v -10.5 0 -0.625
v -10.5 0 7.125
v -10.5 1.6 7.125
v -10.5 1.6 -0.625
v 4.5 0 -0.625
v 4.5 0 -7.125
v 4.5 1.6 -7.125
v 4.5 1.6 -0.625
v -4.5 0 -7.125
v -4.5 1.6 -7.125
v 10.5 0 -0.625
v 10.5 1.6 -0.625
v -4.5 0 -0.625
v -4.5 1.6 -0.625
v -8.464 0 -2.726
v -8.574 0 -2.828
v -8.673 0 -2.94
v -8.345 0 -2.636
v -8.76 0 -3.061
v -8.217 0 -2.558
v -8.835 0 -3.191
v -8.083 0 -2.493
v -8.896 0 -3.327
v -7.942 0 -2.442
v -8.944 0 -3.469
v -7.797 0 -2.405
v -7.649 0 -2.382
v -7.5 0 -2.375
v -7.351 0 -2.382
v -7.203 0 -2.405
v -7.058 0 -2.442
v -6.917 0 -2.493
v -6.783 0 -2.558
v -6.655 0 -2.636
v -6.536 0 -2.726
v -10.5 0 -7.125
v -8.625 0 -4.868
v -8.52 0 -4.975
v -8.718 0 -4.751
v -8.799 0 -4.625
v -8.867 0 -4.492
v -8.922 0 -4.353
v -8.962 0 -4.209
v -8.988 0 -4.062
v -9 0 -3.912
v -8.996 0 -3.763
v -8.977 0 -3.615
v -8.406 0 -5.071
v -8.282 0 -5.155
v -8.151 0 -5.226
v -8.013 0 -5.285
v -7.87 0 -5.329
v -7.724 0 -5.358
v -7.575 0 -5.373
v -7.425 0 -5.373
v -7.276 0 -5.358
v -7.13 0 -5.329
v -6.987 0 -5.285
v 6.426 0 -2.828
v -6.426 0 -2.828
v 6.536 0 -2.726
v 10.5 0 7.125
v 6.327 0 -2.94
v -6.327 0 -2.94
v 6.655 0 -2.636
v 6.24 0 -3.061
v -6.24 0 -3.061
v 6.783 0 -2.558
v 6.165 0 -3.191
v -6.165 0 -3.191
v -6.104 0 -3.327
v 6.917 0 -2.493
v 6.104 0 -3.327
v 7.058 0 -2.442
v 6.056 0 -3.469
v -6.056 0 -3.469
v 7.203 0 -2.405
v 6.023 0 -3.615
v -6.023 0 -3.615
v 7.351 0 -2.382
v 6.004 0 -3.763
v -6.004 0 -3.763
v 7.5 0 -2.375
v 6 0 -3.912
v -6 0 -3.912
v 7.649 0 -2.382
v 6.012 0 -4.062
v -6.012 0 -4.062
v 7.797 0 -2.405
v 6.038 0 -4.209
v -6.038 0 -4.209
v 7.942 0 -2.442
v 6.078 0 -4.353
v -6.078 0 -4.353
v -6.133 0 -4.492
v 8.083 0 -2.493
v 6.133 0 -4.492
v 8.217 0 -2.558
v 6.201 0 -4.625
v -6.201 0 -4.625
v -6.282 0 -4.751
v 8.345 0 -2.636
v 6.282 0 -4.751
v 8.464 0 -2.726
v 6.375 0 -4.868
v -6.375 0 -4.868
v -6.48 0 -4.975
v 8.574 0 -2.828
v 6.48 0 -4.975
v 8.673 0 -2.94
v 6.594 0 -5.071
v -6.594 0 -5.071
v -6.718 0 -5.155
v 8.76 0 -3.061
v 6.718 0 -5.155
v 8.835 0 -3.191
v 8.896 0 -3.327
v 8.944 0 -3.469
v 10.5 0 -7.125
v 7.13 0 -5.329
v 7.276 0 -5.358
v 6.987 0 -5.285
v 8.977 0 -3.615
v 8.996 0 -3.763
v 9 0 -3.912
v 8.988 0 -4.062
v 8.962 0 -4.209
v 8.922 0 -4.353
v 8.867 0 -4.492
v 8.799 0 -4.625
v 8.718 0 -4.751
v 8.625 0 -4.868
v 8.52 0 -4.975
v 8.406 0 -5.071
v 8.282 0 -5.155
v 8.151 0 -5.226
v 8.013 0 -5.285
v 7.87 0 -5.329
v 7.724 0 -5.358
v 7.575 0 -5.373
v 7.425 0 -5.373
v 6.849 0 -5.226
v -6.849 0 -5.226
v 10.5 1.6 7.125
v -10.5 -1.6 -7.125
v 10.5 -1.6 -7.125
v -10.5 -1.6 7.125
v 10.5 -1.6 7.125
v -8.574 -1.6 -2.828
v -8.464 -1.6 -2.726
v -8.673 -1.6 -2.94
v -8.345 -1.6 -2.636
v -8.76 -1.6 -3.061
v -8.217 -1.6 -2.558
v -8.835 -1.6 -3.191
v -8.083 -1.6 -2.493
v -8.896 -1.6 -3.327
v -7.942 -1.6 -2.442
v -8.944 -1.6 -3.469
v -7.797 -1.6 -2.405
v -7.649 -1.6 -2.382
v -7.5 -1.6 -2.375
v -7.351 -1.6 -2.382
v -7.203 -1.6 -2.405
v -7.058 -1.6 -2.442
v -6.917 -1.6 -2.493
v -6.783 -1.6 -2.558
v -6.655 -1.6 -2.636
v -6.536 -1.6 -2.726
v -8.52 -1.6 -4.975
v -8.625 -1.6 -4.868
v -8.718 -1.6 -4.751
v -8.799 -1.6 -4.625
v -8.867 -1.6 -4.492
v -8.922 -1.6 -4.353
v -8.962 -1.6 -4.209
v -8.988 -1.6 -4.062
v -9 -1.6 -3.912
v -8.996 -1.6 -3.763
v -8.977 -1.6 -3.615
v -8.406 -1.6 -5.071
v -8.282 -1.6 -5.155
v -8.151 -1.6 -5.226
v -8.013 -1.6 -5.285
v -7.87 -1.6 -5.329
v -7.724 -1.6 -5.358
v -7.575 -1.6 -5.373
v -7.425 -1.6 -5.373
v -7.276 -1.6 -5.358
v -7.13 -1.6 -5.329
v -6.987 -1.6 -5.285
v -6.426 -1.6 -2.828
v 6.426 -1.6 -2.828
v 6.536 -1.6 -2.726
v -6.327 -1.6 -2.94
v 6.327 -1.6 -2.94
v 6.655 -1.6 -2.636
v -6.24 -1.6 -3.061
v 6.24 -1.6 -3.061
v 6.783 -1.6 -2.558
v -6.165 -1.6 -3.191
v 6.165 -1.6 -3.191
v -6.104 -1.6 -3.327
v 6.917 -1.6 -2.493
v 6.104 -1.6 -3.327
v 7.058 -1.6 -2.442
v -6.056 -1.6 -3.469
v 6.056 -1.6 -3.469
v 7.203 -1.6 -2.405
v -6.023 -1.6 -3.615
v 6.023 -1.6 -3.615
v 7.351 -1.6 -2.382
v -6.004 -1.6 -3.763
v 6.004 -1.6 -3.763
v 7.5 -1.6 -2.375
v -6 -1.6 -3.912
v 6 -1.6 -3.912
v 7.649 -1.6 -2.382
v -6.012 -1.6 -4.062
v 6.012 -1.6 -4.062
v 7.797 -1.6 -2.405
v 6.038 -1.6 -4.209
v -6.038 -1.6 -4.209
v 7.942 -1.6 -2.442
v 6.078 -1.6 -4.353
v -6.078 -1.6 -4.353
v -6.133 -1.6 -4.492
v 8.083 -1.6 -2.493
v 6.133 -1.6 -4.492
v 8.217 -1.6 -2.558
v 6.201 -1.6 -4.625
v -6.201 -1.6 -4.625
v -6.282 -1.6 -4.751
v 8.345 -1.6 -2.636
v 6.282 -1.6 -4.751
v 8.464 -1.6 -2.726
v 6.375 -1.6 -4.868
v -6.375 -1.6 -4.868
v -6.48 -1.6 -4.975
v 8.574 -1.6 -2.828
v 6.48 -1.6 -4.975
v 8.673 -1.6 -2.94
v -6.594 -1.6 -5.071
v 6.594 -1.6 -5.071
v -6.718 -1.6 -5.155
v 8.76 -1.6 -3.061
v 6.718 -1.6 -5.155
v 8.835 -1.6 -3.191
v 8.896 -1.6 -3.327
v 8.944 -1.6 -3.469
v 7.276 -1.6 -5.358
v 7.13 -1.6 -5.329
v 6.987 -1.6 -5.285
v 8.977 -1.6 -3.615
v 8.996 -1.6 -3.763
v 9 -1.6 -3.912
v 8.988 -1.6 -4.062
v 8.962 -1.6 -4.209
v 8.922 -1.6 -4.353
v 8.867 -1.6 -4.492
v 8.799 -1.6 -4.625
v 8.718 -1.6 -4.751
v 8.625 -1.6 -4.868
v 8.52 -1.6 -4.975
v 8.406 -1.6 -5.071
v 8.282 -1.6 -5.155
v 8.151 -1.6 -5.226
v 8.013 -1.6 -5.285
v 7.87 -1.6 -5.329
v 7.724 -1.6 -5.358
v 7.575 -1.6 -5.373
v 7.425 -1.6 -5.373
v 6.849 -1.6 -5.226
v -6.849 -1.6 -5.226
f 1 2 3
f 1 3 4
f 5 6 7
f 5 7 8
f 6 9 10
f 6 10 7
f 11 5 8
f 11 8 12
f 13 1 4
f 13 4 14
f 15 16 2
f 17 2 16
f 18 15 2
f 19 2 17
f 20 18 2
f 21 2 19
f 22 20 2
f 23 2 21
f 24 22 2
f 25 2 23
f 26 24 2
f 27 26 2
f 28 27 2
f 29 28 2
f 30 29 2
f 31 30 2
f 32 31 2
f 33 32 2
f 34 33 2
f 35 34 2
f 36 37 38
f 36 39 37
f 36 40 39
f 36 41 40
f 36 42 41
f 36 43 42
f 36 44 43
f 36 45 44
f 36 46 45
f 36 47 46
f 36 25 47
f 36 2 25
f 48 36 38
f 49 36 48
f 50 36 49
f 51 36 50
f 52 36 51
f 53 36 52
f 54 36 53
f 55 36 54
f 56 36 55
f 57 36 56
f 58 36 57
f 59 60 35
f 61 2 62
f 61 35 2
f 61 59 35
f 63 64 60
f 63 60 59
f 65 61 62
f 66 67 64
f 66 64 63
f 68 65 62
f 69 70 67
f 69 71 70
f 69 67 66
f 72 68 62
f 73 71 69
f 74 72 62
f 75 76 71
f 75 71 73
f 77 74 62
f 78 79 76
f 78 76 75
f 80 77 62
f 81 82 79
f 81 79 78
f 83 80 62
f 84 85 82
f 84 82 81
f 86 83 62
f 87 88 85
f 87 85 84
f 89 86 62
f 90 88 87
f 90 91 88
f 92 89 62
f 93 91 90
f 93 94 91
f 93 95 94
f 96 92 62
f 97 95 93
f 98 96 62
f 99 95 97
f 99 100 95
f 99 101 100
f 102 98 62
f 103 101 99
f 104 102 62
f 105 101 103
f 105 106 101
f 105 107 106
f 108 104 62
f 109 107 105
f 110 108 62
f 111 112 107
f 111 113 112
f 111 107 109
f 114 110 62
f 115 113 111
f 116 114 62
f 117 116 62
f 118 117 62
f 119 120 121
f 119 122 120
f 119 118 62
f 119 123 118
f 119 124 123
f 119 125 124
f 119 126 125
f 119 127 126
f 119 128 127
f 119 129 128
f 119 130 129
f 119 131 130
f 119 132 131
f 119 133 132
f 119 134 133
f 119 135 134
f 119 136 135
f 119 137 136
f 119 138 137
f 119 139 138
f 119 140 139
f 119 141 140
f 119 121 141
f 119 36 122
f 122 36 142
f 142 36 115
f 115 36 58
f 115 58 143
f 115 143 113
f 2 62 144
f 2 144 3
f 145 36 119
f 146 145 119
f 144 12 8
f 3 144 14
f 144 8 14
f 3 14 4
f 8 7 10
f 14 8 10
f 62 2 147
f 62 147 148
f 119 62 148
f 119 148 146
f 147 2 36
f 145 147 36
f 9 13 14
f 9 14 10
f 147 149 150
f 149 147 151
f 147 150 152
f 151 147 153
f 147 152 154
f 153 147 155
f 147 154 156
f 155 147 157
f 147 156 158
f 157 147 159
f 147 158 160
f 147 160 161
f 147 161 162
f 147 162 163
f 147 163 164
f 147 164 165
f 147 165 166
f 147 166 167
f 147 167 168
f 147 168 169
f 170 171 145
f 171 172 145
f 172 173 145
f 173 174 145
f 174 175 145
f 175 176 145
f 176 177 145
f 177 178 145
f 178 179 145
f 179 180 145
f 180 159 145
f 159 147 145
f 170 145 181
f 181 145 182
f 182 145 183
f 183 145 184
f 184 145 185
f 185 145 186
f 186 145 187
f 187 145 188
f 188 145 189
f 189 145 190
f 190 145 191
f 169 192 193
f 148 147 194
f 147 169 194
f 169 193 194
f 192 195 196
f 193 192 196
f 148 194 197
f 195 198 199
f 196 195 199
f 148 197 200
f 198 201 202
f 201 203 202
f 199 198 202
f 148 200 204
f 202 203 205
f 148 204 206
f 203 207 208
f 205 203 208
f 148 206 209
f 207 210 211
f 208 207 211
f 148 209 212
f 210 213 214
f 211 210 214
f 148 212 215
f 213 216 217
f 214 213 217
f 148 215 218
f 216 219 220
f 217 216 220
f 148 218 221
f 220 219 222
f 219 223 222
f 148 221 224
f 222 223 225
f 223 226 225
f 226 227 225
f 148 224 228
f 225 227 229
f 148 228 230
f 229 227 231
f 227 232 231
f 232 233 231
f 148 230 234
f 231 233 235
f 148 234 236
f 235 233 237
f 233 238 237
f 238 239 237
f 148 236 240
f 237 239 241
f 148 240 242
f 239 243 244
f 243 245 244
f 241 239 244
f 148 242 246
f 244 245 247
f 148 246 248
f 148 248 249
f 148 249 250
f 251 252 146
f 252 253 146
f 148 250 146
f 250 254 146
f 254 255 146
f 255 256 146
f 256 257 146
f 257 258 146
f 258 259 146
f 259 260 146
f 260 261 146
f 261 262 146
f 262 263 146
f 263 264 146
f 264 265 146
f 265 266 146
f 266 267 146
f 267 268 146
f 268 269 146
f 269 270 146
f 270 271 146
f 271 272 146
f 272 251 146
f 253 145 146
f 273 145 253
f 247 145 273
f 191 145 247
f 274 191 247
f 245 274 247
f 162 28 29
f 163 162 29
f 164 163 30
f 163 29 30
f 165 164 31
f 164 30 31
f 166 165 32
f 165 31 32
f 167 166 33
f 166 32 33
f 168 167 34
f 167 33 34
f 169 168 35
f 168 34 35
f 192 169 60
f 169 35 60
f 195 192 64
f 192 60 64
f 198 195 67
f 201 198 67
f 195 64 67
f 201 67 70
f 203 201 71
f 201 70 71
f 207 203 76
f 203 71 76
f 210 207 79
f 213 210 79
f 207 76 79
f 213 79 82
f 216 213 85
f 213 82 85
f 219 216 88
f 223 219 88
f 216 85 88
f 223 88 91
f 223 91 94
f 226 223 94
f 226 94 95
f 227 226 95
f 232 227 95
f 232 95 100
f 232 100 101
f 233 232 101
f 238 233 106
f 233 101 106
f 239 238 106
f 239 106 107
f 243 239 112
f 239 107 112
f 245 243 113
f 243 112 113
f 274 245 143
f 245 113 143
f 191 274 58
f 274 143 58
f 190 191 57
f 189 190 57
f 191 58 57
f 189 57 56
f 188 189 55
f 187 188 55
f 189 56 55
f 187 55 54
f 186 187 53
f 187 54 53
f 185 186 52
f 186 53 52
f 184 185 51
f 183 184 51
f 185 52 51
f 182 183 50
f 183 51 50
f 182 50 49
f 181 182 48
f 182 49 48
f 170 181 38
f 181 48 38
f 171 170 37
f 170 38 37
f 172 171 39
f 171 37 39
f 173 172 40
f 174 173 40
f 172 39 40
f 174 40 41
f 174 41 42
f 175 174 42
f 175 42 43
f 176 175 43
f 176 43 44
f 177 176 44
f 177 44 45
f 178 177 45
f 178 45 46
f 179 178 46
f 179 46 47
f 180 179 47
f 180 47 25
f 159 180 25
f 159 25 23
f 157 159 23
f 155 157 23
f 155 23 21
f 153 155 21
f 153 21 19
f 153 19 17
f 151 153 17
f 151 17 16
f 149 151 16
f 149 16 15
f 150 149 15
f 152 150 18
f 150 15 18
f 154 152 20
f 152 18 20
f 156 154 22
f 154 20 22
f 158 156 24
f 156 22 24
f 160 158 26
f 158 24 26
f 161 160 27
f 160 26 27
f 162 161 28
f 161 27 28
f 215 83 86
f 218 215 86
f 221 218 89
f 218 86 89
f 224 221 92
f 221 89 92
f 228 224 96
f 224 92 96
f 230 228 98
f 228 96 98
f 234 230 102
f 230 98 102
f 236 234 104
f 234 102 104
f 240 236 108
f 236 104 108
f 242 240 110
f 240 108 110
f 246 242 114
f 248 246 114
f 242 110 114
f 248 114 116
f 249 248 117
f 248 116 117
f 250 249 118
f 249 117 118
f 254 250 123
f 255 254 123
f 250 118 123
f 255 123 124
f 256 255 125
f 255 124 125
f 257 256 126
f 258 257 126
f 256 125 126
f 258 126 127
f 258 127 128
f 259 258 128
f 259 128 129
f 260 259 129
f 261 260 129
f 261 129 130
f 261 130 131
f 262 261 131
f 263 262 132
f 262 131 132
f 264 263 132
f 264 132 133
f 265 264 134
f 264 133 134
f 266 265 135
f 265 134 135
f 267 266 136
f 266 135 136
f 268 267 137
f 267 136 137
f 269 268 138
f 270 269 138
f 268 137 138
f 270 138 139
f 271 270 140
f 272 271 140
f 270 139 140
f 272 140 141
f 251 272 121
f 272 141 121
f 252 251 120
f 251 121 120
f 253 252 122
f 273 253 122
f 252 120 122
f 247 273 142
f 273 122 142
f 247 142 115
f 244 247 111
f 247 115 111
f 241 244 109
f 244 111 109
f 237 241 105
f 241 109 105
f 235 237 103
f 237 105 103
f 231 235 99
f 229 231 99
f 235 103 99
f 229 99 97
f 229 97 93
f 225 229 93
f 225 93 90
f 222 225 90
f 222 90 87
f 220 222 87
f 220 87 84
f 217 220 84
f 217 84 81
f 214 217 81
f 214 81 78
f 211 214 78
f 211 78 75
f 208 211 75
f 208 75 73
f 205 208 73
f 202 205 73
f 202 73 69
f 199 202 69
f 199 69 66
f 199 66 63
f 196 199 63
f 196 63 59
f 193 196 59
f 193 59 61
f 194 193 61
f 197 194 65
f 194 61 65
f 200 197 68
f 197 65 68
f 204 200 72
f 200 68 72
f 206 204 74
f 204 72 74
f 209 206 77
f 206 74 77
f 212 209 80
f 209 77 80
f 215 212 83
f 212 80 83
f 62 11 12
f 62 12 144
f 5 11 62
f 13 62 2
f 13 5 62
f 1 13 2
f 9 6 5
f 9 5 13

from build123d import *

# Parameters (mm, degrees)
SKETCH1_W           = 21
SKETCH1_H           = 14.25
SKETCH1_R           = 1.5
BOSS_EXTRUDE1_DEPTH = 1.6
BOSS_EXTRUDE2_DEPTH = 1.6


with BuildPart() as part:
    # Sketch1 → Boss-Extrude1 (new body)
    with BuildSketch(Plane(origin=(0, 0, 0), x_dir=(1, 0, 0), z_dir=(0, 1, 0))):
        Rectangle(SKETCH1_W, SKETCH1_H)
        with Locations(Location((-7.5, 3.875, 0), (0, 0, 270))):
            Circle(SKETCH1_R, mode=Mode.SUBTRACT)
        with Locations(Location((7.5, 3.875, 0), (0, 0, 270))):
            Circle(SKETCH1_R, mode=Mode.SUBTRACT)
    extrude(amount=-BOSS_EXTRUDE1_DEPTH)


with BuildPart() as body_2:
    # Sketch2 → Boss-Extrude2 (new body)
    with BuildSketch(Plane(origin=(0, 0, 0), x_dir=(1, 0, 0), z_dir=(0, 1, 0))):
        Polygon((-10.5, 0.625), (-4.5, 0.625), (-4.5, 7.125), (4.5, 7.125), (4.5, 0.625), (10.5, 0.625), (10.5, -7.125), (-10.5, -7.125), align=None)
    extrude(amount=BOSS_EXTRUDE2_DEPTH)


solid = Compound([part.part, body_2.part])
